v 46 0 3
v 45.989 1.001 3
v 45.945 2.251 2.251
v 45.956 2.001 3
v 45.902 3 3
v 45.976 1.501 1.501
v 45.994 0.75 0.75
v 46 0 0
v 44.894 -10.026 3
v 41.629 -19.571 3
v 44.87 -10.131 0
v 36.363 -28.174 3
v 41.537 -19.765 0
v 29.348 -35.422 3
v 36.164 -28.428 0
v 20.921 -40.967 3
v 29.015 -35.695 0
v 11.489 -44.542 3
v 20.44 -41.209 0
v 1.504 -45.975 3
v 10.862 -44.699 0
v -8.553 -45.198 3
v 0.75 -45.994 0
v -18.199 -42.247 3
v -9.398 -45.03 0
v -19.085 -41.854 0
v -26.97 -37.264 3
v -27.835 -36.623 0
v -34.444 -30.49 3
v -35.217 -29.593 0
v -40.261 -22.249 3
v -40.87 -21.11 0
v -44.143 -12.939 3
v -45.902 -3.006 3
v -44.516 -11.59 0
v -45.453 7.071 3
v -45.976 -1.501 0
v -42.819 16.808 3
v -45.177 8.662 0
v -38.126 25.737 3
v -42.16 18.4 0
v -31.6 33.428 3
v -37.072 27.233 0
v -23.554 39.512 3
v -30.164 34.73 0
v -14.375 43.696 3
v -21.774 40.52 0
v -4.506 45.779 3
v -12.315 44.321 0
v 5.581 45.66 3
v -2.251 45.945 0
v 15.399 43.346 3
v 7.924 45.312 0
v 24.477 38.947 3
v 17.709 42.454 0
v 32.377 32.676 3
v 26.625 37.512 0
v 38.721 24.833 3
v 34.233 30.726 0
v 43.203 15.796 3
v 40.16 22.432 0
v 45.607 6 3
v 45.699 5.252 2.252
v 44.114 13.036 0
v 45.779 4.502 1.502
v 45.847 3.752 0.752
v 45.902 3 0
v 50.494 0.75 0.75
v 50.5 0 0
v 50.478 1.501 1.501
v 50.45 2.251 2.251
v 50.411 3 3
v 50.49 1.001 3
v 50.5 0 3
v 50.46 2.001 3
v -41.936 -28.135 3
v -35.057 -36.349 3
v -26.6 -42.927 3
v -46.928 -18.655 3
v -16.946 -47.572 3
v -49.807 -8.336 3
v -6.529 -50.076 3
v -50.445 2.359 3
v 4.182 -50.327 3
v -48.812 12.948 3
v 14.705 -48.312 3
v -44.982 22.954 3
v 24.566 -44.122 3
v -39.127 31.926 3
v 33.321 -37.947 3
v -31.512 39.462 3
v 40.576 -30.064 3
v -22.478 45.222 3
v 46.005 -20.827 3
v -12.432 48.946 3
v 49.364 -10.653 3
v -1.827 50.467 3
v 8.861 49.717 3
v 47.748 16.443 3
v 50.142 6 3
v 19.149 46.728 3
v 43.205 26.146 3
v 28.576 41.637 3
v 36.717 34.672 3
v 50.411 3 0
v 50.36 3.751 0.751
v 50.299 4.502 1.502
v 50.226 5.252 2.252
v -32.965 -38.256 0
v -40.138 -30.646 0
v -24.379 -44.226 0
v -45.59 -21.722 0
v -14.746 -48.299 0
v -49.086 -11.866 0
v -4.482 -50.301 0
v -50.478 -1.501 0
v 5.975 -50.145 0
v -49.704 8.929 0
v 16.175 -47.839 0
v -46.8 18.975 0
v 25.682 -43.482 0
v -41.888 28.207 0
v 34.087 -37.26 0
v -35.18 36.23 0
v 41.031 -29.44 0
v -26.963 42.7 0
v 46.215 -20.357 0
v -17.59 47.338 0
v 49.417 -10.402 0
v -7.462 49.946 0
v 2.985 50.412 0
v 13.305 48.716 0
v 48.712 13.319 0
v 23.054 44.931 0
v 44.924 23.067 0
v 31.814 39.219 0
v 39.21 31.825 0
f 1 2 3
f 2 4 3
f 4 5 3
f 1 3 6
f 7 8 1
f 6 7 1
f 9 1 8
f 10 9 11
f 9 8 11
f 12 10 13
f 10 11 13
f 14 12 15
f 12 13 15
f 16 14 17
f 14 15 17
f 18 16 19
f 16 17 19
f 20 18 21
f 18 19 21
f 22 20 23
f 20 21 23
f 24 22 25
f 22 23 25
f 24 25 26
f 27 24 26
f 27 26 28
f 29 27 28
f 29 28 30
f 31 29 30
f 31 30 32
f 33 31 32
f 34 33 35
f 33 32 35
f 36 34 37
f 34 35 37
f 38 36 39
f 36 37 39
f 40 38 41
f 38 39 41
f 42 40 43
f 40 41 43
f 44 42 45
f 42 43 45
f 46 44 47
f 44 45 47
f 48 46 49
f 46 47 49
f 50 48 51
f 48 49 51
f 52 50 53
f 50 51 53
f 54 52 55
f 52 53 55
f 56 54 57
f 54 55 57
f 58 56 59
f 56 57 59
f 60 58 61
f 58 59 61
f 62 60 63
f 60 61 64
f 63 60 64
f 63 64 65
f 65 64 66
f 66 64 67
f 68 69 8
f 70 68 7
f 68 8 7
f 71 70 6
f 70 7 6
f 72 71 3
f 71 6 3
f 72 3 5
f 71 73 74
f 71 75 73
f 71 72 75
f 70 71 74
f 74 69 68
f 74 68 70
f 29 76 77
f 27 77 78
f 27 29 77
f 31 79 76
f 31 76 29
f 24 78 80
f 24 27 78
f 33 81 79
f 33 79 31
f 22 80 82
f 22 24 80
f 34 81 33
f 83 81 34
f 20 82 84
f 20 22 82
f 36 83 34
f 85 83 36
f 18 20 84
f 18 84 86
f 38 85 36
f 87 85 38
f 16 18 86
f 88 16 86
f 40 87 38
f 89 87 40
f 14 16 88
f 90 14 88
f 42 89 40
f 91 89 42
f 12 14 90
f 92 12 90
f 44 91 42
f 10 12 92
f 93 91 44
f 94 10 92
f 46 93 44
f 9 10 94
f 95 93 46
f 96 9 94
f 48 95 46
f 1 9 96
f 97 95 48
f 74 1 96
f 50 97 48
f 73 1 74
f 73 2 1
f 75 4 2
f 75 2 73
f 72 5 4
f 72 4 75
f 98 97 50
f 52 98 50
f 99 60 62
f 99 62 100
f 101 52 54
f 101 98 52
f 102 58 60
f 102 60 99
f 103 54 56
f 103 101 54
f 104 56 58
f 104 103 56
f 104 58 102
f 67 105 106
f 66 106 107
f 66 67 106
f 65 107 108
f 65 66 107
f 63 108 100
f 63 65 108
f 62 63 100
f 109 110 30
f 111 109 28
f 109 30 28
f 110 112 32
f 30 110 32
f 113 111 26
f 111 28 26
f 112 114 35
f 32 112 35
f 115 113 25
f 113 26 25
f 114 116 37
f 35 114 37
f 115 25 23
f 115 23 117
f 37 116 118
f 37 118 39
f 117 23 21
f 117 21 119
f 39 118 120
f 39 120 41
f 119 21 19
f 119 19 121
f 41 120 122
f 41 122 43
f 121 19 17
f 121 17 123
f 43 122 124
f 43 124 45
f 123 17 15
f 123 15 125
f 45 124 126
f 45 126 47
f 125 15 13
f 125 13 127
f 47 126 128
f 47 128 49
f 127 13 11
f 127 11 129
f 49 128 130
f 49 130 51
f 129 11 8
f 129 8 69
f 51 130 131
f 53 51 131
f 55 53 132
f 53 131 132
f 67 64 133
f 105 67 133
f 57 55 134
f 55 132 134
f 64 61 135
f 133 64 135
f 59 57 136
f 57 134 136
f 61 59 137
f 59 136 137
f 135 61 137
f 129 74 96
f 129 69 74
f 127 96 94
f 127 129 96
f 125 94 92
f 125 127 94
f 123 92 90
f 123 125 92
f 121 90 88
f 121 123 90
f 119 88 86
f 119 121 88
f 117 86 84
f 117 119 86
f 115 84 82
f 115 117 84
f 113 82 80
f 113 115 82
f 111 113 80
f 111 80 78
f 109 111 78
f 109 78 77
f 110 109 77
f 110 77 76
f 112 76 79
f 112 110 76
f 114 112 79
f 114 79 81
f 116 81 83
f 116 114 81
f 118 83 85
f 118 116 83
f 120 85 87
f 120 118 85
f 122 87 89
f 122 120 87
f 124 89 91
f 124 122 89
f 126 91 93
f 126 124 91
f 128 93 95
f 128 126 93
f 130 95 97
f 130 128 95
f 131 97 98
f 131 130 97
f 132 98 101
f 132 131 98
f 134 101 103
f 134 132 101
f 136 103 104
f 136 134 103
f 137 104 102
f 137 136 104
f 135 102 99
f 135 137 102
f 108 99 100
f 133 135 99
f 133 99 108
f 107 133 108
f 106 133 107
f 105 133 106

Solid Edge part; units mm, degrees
sketch "Sketch1" plane through (0, 0, 0) normal (0, 0, 1) x (1, 0, 0)
  circle A0 centre (0, 0) radius 46
  circle A1 centre (0, 0) radius 50.5
  dimension "D1" = 101
  dimension "D2" = 92
extrude "Protrusion1" add sketch "Sketch1" along normal blind 3
sketch "Sketch2" plane through (0, 0, 0) normal (1, 0, 0) x (0, 1, 0)
  line L0 (0, 0) -> (3, 3)
  line L1 (3, 3) -> (6, 3)
  line L2 (3, 0) -> (6, 3)
  line L3 (0, 0) -> (3, 0)
extrude "ExtrudedCutout_1" cut sketch "Sketch2" along normal blind 77.4946
properties part number "4" material "Cast Iron"
